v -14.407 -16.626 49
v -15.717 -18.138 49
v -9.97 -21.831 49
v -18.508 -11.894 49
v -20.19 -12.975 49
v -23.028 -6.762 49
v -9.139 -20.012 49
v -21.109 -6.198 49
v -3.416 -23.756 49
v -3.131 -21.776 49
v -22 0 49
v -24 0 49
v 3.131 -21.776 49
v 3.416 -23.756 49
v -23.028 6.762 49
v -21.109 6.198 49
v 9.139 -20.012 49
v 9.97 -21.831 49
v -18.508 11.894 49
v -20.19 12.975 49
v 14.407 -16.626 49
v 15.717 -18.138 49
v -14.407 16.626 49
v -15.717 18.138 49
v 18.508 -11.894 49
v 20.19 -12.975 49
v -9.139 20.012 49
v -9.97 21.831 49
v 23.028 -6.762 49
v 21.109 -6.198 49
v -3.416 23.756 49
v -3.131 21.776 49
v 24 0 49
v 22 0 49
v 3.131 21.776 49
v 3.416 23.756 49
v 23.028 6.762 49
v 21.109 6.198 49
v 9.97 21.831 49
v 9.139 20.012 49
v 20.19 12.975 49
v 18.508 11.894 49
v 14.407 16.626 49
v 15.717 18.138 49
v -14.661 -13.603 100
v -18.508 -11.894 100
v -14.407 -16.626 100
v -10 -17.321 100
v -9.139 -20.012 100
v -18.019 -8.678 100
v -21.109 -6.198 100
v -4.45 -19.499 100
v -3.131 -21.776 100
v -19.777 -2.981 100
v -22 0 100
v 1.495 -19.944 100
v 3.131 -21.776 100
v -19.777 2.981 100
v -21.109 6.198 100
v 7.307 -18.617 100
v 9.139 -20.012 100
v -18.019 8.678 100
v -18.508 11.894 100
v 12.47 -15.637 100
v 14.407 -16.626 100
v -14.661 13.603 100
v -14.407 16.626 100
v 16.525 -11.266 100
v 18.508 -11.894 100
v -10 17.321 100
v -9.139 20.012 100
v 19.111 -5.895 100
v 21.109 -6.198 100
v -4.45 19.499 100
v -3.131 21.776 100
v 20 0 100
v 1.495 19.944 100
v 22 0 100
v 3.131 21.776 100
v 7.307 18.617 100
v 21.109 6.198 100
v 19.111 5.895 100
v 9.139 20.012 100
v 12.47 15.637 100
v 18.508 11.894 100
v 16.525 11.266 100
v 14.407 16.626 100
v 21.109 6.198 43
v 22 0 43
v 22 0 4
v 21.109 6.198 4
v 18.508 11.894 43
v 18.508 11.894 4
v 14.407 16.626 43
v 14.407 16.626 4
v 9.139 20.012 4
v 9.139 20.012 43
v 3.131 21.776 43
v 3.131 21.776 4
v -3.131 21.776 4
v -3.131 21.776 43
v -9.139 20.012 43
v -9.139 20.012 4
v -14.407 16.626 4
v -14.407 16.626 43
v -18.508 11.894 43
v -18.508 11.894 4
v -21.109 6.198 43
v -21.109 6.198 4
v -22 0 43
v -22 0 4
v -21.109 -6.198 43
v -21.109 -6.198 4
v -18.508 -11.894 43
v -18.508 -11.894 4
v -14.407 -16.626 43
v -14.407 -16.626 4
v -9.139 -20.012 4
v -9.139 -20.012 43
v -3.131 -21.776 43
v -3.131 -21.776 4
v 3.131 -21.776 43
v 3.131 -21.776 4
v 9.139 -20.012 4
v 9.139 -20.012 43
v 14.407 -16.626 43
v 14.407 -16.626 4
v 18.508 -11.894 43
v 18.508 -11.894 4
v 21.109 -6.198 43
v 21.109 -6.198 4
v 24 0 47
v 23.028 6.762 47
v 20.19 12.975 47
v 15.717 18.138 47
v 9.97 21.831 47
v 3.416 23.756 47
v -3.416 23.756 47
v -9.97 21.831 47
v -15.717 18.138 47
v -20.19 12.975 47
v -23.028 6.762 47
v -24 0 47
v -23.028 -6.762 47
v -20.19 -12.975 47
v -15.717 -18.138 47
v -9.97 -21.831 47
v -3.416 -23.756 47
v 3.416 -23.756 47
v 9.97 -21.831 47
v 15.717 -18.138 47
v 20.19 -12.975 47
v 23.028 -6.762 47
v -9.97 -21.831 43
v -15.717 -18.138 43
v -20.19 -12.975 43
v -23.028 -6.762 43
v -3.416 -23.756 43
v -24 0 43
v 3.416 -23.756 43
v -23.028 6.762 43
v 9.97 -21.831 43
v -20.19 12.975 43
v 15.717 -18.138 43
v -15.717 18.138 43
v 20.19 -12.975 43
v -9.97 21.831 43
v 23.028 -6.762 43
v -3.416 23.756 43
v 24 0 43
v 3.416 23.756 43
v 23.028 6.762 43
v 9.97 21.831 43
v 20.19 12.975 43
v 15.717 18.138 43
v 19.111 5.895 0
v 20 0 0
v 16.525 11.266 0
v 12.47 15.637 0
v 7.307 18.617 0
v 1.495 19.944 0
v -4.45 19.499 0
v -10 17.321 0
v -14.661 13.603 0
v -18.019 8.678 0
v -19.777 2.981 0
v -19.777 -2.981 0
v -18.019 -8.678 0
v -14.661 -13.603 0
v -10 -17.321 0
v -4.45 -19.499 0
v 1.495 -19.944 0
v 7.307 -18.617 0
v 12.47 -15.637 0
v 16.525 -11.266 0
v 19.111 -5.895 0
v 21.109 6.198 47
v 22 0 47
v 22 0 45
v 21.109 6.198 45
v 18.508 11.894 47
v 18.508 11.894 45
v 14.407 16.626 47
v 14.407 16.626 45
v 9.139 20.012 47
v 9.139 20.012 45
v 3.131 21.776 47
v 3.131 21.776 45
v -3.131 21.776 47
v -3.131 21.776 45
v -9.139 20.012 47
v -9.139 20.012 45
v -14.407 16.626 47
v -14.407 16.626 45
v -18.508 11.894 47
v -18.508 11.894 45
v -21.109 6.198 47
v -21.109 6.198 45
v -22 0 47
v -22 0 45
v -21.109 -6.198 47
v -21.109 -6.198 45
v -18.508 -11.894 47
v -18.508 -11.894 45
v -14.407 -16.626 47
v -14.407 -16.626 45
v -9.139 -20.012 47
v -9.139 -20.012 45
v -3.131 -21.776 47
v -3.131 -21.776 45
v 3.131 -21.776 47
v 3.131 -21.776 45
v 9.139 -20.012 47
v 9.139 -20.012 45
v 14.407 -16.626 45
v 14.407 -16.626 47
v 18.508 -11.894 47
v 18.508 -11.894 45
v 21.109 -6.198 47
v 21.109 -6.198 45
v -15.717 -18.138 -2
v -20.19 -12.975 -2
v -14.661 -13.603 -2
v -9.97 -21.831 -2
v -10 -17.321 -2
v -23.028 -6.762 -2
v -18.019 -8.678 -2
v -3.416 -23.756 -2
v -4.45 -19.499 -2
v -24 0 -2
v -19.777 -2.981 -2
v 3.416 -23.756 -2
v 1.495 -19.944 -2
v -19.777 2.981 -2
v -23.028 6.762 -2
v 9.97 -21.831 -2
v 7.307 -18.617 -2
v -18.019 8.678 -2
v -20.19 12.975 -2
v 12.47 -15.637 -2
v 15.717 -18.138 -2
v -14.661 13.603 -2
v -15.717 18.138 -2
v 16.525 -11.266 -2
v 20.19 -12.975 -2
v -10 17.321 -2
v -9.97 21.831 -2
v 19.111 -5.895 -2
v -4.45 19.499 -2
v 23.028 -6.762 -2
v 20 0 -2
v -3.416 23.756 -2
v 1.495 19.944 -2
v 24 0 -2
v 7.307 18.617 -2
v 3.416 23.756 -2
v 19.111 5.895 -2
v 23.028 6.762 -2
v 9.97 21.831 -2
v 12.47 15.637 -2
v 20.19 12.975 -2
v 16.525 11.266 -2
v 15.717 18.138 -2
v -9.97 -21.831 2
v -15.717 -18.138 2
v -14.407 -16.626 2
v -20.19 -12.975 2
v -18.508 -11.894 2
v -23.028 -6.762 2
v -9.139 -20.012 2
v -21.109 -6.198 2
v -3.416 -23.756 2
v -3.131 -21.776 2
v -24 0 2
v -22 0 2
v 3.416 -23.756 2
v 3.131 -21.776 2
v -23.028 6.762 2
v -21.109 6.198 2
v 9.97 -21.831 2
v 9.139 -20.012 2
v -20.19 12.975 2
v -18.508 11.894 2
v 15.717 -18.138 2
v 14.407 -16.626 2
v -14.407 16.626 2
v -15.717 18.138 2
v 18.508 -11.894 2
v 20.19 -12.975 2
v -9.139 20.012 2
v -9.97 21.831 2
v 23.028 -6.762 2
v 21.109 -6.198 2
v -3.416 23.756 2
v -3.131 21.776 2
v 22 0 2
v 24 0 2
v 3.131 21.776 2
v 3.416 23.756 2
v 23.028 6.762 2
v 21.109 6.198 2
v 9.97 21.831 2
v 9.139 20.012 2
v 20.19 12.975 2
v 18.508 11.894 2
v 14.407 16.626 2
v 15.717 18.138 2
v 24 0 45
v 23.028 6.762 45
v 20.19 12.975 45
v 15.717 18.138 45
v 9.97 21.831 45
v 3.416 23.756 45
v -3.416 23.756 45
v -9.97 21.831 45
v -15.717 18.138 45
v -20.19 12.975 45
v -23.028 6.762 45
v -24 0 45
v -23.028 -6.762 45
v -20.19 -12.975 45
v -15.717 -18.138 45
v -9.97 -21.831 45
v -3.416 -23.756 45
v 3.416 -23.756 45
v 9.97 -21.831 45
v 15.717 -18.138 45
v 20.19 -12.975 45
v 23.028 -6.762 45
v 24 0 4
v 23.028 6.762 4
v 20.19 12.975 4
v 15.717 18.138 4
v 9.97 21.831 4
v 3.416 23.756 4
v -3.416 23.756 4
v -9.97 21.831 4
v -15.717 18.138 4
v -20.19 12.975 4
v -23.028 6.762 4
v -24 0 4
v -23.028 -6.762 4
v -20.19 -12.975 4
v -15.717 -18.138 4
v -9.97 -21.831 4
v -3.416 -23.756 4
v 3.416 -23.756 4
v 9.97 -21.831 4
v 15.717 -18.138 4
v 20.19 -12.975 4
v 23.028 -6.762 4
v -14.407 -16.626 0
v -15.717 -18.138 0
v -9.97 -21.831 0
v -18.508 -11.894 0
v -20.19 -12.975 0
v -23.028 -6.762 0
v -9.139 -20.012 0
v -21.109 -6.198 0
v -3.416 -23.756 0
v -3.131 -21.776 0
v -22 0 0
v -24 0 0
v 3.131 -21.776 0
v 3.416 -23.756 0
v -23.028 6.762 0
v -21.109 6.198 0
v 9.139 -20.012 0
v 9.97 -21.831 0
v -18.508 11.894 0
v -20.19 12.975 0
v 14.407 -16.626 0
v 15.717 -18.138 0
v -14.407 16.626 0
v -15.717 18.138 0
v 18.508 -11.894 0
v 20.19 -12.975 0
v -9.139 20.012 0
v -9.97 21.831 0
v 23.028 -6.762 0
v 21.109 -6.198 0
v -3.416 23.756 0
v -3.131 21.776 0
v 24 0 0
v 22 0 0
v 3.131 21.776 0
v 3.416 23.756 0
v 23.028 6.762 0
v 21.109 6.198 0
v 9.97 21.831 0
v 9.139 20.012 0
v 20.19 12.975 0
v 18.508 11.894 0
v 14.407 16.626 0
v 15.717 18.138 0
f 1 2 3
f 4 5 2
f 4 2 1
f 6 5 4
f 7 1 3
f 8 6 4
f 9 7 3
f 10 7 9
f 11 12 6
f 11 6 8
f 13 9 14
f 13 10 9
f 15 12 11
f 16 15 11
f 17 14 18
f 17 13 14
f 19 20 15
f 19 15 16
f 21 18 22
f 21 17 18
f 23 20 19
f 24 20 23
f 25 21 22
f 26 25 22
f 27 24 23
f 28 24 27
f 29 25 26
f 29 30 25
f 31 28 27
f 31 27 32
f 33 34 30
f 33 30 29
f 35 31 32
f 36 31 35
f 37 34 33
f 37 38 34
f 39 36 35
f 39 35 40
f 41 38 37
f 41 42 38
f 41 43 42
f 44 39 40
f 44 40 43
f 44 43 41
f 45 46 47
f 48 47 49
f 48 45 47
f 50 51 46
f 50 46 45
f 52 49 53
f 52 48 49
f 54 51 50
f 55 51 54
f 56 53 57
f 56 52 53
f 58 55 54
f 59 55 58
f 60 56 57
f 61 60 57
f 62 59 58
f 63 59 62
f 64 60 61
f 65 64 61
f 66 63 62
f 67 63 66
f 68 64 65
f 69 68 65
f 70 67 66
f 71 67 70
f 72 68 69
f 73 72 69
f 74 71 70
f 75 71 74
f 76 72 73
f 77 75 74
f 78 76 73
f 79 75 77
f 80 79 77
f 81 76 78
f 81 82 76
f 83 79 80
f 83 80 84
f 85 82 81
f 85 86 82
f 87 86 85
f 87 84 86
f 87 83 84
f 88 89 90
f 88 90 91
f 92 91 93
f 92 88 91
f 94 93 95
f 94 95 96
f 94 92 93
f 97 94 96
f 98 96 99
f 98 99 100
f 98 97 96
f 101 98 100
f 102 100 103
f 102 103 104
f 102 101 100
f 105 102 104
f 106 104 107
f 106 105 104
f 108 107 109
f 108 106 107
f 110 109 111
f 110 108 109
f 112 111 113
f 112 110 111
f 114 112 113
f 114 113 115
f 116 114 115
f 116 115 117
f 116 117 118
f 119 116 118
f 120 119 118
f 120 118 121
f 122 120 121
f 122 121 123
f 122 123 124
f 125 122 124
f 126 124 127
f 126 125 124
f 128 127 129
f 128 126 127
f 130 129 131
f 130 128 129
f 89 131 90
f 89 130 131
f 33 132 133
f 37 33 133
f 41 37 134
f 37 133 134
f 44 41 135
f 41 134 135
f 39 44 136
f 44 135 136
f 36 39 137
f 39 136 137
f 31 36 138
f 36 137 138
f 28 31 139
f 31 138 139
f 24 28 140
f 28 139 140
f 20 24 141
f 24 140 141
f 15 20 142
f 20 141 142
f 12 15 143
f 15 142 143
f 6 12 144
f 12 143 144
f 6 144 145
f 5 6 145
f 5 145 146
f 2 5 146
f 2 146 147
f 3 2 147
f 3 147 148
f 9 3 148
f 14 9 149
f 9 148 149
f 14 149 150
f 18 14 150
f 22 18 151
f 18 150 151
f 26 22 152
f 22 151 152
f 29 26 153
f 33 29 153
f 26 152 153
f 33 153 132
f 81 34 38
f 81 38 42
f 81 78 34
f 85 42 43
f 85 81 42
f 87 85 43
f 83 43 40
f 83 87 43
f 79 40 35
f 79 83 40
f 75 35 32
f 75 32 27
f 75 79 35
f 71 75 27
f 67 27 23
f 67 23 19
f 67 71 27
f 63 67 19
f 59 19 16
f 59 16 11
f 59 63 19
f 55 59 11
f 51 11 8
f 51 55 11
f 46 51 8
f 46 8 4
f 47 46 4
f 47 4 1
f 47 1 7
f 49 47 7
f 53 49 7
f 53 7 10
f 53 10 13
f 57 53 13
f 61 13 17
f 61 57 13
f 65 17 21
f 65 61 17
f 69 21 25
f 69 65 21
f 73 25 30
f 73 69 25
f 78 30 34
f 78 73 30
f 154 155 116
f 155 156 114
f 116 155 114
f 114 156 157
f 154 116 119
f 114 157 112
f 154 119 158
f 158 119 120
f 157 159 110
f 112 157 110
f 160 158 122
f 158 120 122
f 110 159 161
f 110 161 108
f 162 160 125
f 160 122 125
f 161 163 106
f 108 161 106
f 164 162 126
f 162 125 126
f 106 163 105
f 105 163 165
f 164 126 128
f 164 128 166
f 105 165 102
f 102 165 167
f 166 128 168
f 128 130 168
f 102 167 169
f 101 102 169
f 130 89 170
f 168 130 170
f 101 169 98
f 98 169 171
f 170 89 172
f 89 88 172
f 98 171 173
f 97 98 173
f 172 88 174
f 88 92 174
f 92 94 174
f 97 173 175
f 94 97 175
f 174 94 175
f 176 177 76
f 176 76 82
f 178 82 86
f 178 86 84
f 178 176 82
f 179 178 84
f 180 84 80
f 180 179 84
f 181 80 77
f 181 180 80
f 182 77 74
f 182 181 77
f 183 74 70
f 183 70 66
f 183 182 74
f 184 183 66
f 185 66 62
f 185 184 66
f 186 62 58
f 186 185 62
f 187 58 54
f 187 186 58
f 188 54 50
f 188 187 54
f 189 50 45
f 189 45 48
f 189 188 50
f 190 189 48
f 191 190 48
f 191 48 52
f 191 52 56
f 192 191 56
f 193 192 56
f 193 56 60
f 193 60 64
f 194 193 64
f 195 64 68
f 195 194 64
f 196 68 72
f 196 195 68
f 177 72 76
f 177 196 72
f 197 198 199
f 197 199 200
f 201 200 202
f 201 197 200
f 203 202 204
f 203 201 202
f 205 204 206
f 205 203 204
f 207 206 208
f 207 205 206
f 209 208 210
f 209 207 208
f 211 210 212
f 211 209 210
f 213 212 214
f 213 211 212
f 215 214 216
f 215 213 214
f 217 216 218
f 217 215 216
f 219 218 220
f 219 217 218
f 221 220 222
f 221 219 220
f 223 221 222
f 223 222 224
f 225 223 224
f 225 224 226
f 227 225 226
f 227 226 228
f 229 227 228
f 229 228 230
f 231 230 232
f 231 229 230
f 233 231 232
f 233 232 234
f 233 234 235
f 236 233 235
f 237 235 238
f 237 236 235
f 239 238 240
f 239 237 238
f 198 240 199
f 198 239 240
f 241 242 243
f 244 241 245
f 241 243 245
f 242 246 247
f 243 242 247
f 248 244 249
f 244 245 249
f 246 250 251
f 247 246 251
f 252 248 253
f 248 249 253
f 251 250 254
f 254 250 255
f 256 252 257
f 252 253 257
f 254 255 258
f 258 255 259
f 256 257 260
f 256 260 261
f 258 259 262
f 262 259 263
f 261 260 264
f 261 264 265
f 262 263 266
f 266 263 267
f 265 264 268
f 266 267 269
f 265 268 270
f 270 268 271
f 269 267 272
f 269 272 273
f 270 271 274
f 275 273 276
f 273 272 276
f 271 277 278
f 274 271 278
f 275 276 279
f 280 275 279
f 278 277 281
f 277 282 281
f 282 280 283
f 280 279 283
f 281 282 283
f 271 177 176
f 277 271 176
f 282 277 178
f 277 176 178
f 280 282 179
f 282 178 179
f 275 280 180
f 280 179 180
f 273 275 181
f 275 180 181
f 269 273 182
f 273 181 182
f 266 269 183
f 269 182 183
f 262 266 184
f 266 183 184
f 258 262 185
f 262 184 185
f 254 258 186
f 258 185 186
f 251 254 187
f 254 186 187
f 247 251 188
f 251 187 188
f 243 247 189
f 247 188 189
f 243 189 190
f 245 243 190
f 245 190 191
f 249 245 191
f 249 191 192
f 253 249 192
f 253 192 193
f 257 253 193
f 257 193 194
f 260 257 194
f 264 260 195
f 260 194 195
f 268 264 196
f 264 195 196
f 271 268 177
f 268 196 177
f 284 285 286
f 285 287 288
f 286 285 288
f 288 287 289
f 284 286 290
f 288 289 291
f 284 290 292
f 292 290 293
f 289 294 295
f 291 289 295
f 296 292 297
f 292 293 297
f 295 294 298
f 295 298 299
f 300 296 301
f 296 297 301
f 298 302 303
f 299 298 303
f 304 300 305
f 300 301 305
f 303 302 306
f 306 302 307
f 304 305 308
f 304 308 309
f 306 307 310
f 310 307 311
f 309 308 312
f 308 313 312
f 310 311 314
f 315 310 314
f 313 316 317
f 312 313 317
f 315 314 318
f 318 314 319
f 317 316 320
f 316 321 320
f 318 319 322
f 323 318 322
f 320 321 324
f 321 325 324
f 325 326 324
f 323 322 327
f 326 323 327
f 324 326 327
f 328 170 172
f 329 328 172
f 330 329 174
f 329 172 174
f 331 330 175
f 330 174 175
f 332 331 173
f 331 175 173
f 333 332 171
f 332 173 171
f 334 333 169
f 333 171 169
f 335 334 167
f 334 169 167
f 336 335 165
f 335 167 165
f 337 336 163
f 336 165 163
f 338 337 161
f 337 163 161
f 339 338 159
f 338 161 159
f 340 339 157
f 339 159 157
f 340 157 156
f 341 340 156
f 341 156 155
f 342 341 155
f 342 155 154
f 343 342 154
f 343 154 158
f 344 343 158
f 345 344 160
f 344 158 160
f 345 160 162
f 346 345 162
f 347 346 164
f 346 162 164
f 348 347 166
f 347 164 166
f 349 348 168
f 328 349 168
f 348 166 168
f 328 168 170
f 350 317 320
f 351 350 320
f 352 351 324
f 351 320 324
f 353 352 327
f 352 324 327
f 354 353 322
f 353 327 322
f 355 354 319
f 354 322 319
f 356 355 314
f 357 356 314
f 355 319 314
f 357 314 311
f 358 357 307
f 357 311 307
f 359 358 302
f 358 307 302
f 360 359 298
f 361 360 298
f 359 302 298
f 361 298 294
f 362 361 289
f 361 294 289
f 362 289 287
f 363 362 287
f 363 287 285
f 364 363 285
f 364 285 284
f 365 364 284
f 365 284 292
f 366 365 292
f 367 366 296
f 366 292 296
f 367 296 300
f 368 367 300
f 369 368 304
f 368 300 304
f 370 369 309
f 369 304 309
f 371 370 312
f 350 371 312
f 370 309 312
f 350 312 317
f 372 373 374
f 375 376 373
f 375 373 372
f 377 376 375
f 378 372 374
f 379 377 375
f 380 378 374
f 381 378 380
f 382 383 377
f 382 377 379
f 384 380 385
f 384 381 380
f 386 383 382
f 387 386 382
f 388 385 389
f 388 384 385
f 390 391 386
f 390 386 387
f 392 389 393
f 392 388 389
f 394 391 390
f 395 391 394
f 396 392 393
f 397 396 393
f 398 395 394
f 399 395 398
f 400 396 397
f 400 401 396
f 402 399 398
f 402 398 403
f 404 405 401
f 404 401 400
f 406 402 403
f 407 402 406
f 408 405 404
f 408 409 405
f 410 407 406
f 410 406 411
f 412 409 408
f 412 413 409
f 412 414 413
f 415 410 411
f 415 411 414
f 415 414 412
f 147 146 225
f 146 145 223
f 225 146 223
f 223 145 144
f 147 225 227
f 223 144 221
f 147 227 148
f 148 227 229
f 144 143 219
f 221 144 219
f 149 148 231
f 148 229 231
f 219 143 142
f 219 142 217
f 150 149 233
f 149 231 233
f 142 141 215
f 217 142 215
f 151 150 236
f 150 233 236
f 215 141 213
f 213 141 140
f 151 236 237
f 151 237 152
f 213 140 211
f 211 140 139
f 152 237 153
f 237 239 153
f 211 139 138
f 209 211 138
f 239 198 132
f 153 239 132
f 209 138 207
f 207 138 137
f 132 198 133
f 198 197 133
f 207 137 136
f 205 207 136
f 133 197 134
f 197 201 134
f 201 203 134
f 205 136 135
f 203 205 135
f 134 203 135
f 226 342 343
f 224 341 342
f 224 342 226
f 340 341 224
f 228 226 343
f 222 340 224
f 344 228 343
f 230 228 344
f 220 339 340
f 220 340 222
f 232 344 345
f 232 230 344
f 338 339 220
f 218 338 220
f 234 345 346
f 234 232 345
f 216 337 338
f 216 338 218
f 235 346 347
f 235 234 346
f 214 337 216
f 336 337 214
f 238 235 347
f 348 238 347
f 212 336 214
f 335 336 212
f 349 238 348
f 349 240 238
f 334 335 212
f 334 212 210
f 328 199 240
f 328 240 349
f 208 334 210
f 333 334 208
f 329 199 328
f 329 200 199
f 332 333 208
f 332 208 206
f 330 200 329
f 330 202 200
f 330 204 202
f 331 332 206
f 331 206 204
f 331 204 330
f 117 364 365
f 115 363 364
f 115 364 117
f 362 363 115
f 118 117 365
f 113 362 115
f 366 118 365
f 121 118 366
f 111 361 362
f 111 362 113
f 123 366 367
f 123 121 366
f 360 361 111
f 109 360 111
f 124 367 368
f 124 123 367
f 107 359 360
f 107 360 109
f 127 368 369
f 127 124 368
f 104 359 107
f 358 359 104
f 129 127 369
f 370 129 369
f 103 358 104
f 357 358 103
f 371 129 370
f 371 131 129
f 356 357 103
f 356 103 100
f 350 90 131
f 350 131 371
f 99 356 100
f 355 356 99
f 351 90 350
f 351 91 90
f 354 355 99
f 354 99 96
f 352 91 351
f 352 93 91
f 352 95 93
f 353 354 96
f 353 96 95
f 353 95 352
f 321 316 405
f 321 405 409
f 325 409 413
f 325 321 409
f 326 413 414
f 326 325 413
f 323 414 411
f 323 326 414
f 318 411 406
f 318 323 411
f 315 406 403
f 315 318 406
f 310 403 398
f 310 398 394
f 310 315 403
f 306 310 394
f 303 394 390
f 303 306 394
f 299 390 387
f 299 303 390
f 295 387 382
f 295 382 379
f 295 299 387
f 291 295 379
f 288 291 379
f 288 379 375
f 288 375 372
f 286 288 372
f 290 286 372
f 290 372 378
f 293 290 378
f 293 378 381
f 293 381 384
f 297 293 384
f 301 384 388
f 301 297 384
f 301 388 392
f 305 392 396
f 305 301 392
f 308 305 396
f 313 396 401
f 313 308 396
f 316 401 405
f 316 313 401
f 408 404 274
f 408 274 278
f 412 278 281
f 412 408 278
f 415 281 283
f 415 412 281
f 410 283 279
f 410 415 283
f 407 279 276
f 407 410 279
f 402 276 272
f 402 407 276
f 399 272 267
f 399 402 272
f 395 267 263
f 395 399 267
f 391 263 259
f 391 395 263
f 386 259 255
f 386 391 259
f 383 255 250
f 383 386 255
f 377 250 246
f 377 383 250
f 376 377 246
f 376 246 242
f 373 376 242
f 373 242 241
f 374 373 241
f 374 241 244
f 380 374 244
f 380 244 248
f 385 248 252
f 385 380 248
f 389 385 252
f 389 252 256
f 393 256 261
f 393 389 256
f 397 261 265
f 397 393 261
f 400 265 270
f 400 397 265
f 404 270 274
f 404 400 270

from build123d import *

# Parameters (mm, degrees)
F0_R          = 22
F0_R_2        = 20
F1_DEPTH      = 100
F1_DEPTH_BACK = 2
F0_R_3        = 24
F2_DEPTH      = 2
F3_START      = 2
F3_DEPTH      = 2
F4_START      = 43
F4_DEPTH      = 2
F5_START      = 47
F5_DEPTH      = 2


with BuildPart() as f1:
    # F0 (on Top) → F1 (new body, two sides)
    with BuildSketch(Plane.XY) as f1_sk:
        Circle(F0_R)
        Circle(F0_R_2, mode=Mode.SUBTRACT)
    extrude(amount=F1_DEPTH)
    extrude(f1_sk.sketch, amount=-F1_DEPTH_BACK)

    # F0 (on Top) → F2 (join)
    with BuildSketch(Plane.XY):
        Circle(F0_R_3)
        Circle(F0_R, mode=Mode.SUBTRACT)
    extrude(amount=-F2_DEPTH)

    # F0 (on Top) → F3 (join)
    with BuildSketch(Plane.XY.offset(F3_START)):
        Circle(F0_R_3)
        Circle(F0_R, mode=Mode.SUBTRACT)
    extrude(amount=F3_DEPTH)

    # F0 (on Top) → F4 (join)
    with BuildSketch(Plane.XY.offset(F4_START)):
        Circle(F0_R_3)
        Circle(F0_R, mode=Mode.SUBTRACT)
    extrude(amount=F4_DEPTH)

    # F0 (on Top) → F5 (join)
    with BuildSketch(Plane.XY.offset(F5_START)):
        Circle(F0_R_3)
        Circle(F0_R, mode=Mode.SUBTRACT)
    extrude(amount=F5_DEPTH)


solid = f1.part
